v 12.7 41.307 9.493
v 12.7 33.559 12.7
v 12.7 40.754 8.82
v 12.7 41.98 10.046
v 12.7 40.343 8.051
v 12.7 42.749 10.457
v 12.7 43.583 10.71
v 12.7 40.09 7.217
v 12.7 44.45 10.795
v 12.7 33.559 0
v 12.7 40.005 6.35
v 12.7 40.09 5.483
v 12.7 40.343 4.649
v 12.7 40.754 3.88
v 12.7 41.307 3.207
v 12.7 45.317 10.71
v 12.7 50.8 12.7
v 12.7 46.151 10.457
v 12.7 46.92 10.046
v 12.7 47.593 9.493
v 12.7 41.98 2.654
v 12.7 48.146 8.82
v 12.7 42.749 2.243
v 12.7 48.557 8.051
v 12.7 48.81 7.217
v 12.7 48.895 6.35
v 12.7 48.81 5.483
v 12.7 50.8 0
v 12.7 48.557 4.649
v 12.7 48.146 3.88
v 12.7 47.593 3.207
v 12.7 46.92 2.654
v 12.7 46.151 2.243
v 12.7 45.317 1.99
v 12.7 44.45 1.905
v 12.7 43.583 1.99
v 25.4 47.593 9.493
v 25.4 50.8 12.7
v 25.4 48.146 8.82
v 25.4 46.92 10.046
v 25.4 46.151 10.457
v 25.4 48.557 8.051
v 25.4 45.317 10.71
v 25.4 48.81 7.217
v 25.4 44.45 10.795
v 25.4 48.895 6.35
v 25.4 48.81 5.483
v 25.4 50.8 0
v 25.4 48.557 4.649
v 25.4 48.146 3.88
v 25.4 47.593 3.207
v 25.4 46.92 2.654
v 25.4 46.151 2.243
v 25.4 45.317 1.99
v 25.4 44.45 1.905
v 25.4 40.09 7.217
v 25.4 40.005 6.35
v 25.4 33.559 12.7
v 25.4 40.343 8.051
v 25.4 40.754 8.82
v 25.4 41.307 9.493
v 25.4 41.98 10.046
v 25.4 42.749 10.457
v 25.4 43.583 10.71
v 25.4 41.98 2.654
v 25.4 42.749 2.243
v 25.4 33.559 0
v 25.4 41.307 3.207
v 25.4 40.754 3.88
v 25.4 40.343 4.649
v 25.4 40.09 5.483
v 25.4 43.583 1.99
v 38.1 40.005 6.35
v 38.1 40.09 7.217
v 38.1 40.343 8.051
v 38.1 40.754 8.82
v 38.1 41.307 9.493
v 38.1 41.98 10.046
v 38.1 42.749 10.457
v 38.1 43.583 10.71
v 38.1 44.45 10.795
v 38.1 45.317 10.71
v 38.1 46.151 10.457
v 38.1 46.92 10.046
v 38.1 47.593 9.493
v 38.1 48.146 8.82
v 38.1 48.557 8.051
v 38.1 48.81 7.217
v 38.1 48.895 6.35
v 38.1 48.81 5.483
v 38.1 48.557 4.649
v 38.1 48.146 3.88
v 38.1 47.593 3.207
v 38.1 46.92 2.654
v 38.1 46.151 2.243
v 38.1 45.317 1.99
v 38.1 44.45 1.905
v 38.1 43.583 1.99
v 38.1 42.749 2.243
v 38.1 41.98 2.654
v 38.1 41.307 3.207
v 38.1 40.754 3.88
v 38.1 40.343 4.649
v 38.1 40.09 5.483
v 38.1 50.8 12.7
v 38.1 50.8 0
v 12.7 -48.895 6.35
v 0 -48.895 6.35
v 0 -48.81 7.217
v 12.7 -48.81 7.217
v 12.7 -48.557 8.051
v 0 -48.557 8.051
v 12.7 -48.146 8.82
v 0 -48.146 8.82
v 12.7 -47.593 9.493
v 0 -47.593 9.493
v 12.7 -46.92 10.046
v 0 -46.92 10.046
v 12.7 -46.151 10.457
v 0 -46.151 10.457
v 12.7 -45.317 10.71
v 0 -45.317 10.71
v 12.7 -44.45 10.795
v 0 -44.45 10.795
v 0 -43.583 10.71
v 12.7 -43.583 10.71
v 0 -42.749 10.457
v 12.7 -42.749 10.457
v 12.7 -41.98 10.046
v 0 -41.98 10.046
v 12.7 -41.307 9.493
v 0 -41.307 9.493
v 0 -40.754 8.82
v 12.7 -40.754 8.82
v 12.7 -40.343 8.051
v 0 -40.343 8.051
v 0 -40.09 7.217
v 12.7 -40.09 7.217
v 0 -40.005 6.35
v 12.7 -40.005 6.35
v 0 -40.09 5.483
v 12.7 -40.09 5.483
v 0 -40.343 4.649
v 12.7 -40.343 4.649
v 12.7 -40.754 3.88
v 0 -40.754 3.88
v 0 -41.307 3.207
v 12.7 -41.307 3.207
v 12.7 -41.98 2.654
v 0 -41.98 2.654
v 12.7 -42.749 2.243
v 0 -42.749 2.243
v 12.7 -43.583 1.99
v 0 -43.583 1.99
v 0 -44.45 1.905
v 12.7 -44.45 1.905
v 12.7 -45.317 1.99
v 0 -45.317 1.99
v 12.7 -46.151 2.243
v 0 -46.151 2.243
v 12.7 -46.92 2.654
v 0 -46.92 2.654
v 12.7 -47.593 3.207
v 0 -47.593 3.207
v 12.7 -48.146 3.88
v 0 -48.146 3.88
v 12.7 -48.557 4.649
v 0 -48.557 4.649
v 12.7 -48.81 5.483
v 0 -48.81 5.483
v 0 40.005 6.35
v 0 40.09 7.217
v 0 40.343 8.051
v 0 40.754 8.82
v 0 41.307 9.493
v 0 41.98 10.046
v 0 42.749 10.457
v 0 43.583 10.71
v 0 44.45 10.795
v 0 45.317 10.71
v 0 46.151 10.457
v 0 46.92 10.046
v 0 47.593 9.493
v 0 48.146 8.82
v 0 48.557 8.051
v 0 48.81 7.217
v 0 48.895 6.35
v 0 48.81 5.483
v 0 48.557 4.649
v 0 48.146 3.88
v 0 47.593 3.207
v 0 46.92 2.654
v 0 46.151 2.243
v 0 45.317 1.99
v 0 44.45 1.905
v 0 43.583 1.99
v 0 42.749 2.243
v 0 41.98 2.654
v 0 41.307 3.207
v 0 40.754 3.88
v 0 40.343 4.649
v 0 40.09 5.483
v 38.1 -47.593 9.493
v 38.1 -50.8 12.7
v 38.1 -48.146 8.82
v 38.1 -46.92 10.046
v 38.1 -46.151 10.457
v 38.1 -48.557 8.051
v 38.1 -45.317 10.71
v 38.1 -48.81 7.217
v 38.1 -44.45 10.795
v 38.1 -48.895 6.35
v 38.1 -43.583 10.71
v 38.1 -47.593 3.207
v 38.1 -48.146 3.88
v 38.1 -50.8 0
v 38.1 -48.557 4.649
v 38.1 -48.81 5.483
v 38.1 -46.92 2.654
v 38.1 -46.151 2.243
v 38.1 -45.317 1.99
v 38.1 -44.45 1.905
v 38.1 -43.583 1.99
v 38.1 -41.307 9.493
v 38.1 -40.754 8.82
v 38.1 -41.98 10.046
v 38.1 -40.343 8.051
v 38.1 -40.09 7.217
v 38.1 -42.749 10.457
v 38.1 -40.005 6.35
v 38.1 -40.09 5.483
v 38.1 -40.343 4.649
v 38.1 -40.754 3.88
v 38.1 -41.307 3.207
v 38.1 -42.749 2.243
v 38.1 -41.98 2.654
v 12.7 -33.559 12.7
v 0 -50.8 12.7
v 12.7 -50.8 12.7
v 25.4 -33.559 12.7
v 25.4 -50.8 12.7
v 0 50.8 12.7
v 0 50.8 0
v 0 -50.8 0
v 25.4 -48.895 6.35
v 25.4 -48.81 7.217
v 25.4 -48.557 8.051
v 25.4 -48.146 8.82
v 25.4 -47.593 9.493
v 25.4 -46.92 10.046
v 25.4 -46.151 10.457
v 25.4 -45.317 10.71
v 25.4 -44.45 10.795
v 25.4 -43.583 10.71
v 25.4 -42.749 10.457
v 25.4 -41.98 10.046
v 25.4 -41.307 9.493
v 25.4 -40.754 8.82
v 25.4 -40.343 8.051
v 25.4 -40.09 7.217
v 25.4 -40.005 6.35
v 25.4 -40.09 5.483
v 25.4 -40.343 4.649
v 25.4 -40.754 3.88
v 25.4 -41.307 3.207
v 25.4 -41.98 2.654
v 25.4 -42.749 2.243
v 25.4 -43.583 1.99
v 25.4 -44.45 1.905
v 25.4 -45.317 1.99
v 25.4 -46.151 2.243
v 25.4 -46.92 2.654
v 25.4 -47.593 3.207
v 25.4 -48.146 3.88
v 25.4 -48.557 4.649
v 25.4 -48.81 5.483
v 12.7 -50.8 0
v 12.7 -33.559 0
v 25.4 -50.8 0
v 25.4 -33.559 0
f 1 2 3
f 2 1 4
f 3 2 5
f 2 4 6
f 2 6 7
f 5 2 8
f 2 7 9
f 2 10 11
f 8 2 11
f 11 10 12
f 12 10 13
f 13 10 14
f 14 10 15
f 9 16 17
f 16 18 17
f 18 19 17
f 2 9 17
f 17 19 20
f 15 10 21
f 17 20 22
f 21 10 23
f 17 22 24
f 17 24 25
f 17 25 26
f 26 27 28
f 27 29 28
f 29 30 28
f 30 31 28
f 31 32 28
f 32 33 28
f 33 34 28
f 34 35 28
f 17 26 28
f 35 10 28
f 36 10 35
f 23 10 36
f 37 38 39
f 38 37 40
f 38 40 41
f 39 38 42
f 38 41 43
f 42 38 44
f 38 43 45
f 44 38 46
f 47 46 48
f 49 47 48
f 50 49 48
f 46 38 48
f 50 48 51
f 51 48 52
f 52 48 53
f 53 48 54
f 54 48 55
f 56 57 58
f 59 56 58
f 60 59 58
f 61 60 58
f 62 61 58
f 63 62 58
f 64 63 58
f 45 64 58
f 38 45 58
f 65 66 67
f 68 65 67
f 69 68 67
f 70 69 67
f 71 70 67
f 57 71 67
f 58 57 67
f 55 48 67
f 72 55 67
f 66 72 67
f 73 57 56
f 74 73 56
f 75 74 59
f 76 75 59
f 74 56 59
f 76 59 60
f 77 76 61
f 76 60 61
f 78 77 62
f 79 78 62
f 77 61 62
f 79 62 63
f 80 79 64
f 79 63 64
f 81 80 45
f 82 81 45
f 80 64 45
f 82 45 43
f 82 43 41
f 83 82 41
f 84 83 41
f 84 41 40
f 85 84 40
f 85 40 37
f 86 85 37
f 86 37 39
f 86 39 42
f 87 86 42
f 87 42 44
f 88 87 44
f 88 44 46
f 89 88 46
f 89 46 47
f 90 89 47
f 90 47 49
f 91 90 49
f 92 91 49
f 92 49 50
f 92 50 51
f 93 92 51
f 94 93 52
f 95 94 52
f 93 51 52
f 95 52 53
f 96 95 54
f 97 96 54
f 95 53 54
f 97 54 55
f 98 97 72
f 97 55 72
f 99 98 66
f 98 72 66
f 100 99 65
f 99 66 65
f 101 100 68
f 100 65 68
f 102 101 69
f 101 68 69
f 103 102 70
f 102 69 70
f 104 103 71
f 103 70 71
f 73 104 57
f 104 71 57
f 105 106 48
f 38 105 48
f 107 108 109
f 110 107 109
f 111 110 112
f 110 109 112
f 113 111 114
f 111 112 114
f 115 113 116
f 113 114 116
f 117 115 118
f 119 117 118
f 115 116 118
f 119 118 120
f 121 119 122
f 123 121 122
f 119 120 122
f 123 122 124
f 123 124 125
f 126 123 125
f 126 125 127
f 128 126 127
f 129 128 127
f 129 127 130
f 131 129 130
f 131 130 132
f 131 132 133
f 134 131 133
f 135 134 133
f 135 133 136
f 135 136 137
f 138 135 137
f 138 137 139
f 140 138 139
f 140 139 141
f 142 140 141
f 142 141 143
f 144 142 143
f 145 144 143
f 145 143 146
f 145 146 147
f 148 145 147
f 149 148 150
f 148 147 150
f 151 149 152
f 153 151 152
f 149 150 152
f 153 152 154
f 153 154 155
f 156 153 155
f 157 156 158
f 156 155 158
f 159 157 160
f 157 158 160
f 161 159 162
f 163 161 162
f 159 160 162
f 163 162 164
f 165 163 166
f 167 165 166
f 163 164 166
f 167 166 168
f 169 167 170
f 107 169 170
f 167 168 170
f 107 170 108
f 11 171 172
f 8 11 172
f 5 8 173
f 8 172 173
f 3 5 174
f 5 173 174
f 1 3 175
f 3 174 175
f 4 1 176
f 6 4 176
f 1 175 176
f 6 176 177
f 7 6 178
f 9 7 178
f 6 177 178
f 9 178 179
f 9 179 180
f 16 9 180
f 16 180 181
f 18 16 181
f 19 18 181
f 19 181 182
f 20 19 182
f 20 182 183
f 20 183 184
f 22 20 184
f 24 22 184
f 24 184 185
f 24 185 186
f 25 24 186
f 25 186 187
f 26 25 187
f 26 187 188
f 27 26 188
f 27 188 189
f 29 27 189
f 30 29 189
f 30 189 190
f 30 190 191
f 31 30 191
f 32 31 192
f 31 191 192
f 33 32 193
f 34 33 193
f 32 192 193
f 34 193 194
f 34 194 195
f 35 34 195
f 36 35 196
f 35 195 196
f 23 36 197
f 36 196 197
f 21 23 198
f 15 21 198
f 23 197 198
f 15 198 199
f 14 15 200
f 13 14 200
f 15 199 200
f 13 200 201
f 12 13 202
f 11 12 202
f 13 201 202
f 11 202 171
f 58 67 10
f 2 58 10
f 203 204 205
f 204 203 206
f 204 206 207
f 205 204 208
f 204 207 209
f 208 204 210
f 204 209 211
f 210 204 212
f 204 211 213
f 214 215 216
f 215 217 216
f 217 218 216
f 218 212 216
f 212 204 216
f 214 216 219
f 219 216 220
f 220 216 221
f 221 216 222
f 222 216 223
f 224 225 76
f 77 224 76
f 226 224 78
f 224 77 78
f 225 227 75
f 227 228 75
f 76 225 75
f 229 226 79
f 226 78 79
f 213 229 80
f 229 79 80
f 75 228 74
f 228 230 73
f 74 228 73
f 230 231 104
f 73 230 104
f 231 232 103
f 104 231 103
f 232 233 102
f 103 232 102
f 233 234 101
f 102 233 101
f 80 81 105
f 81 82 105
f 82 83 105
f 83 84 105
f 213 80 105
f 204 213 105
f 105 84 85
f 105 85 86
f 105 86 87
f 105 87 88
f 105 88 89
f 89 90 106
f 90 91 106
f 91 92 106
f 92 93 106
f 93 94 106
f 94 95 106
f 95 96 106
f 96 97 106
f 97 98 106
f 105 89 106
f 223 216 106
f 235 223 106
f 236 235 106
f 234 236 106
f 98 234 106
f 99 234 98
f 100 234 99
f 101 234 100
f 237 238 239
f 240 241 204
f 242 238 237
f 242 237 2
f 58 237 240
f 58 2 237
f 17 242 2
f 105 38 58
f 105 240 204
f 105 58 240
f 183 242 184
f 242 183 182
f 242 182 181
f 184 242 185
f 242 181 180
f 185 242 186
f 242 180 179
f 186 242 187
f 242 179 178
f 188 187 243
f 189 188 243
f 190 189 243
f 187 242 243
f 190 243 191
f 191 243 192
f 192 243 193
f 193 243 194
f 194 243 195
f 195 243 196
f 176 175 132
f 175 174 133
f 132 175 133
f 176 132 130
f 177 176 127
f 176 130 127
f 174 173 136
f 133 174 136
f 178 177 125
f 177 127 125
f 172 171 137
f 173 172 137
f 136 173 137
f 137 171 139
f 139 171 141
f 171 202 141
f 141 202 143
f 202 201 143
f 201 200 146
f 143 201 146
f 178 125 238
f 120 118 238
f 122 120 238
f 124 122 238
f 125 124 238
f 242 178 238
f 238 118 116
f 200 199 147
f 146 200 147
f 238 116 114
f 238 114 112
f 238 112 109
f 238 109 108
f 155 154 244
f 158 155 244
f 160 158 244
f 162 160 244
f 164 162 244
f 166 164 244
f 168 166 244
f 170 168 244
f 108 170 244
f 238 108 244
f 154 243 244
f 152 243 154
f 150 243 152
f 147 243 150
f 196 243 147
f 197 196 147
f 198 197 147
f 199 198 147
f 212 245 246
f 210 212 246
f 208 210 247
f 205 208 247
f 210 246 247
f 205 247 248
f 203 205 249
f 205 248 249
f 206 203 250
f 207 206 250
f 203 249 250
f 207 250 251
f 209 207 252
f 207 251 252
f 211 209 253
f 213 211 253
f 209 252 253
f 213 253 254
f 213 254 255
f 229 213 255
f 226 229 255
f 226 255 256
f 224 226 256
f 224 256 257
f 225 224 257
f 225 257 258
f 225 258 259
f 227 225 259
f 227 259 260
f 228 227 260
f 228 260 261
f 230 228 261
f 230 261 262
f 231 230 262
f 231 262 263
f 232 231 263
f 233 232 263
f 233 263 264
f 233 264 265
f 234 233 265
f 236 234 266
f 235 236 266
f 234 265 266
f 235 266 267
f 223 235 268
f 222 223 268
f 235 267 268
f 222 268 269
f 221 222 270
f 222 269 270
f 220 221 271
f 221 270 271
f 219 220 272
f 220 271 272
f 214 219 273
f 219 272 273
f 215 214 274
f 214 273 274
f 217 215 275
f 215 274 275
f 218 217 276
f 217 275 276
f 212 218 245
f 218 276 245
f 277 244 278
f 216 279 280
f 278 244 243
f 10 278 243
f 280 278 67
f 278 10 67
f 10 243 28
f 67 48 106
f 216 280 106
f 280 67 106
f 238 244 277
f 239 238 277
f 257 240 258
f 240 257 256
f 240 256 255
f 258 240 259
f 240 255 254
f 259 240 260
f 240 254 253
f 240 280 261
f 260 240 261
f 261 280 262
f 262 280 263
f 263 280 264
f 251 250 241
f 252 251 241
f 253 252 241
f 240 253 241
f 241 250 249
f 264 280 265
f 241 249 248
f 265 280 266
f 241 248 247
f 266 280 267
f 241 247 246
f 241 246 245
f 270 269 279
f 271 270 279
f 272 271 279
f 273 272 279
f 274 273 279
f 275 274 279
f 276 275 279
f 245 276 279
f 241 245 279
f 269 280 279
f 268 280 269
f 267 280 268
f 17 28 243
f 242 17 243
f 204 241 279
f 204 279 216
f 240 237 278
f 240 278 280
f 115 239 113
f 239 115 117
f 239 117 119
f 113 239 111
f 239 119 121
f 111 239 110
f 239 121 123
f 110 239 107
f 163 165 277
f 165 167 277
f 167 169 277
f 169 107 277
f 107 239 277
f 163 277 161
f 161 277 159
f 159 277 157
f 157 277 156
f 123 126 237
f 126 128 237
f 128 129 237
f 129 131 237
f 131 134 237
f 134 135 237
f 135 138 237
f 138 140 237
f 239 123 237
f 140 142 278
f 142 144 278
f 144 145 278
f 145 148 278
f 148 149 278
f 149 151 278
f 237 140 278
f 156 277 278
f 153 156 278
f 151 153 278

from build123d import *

# Parameters (mm, degrees)
F1_DEPTH = 12.7
F2_R     = 4.445
F3_DEPTH = 38.1


with BuildPart() as f1:
    # F0 (on Top) → F1 (new body)
    with BuildSketch(Plane.XY):
        Polygon((12.7, 50.8), (0, 50.8), (0, -50.8), (12.7, -50.8), (12.7, -33.558697), (25.4, -33.558697), (25.4, -50.8), (38.1, -50.8), (38.1, 50.8), (25.4, 50.8), (25.4, 33.558697), (12.7, 33.558697), align=None)
    extrude(amount=F1_DEPTH)

    # F2 (on face) → F3 (cut, through all)
    with BuildSketch(Plane(origin=(0, 0, 0), x_dir=(0, -1, 0), z_dir=(-1, 0, 0))):
        with Locations((-44.45, 6.35)):
            Circle(F2_R)
        with Locations((44.45, 6.35)):
            Circle(F2_R)
    extrude(amount=-F3_DEPTH, mode=Mode.SUBTRACT)


solid = f1.part
